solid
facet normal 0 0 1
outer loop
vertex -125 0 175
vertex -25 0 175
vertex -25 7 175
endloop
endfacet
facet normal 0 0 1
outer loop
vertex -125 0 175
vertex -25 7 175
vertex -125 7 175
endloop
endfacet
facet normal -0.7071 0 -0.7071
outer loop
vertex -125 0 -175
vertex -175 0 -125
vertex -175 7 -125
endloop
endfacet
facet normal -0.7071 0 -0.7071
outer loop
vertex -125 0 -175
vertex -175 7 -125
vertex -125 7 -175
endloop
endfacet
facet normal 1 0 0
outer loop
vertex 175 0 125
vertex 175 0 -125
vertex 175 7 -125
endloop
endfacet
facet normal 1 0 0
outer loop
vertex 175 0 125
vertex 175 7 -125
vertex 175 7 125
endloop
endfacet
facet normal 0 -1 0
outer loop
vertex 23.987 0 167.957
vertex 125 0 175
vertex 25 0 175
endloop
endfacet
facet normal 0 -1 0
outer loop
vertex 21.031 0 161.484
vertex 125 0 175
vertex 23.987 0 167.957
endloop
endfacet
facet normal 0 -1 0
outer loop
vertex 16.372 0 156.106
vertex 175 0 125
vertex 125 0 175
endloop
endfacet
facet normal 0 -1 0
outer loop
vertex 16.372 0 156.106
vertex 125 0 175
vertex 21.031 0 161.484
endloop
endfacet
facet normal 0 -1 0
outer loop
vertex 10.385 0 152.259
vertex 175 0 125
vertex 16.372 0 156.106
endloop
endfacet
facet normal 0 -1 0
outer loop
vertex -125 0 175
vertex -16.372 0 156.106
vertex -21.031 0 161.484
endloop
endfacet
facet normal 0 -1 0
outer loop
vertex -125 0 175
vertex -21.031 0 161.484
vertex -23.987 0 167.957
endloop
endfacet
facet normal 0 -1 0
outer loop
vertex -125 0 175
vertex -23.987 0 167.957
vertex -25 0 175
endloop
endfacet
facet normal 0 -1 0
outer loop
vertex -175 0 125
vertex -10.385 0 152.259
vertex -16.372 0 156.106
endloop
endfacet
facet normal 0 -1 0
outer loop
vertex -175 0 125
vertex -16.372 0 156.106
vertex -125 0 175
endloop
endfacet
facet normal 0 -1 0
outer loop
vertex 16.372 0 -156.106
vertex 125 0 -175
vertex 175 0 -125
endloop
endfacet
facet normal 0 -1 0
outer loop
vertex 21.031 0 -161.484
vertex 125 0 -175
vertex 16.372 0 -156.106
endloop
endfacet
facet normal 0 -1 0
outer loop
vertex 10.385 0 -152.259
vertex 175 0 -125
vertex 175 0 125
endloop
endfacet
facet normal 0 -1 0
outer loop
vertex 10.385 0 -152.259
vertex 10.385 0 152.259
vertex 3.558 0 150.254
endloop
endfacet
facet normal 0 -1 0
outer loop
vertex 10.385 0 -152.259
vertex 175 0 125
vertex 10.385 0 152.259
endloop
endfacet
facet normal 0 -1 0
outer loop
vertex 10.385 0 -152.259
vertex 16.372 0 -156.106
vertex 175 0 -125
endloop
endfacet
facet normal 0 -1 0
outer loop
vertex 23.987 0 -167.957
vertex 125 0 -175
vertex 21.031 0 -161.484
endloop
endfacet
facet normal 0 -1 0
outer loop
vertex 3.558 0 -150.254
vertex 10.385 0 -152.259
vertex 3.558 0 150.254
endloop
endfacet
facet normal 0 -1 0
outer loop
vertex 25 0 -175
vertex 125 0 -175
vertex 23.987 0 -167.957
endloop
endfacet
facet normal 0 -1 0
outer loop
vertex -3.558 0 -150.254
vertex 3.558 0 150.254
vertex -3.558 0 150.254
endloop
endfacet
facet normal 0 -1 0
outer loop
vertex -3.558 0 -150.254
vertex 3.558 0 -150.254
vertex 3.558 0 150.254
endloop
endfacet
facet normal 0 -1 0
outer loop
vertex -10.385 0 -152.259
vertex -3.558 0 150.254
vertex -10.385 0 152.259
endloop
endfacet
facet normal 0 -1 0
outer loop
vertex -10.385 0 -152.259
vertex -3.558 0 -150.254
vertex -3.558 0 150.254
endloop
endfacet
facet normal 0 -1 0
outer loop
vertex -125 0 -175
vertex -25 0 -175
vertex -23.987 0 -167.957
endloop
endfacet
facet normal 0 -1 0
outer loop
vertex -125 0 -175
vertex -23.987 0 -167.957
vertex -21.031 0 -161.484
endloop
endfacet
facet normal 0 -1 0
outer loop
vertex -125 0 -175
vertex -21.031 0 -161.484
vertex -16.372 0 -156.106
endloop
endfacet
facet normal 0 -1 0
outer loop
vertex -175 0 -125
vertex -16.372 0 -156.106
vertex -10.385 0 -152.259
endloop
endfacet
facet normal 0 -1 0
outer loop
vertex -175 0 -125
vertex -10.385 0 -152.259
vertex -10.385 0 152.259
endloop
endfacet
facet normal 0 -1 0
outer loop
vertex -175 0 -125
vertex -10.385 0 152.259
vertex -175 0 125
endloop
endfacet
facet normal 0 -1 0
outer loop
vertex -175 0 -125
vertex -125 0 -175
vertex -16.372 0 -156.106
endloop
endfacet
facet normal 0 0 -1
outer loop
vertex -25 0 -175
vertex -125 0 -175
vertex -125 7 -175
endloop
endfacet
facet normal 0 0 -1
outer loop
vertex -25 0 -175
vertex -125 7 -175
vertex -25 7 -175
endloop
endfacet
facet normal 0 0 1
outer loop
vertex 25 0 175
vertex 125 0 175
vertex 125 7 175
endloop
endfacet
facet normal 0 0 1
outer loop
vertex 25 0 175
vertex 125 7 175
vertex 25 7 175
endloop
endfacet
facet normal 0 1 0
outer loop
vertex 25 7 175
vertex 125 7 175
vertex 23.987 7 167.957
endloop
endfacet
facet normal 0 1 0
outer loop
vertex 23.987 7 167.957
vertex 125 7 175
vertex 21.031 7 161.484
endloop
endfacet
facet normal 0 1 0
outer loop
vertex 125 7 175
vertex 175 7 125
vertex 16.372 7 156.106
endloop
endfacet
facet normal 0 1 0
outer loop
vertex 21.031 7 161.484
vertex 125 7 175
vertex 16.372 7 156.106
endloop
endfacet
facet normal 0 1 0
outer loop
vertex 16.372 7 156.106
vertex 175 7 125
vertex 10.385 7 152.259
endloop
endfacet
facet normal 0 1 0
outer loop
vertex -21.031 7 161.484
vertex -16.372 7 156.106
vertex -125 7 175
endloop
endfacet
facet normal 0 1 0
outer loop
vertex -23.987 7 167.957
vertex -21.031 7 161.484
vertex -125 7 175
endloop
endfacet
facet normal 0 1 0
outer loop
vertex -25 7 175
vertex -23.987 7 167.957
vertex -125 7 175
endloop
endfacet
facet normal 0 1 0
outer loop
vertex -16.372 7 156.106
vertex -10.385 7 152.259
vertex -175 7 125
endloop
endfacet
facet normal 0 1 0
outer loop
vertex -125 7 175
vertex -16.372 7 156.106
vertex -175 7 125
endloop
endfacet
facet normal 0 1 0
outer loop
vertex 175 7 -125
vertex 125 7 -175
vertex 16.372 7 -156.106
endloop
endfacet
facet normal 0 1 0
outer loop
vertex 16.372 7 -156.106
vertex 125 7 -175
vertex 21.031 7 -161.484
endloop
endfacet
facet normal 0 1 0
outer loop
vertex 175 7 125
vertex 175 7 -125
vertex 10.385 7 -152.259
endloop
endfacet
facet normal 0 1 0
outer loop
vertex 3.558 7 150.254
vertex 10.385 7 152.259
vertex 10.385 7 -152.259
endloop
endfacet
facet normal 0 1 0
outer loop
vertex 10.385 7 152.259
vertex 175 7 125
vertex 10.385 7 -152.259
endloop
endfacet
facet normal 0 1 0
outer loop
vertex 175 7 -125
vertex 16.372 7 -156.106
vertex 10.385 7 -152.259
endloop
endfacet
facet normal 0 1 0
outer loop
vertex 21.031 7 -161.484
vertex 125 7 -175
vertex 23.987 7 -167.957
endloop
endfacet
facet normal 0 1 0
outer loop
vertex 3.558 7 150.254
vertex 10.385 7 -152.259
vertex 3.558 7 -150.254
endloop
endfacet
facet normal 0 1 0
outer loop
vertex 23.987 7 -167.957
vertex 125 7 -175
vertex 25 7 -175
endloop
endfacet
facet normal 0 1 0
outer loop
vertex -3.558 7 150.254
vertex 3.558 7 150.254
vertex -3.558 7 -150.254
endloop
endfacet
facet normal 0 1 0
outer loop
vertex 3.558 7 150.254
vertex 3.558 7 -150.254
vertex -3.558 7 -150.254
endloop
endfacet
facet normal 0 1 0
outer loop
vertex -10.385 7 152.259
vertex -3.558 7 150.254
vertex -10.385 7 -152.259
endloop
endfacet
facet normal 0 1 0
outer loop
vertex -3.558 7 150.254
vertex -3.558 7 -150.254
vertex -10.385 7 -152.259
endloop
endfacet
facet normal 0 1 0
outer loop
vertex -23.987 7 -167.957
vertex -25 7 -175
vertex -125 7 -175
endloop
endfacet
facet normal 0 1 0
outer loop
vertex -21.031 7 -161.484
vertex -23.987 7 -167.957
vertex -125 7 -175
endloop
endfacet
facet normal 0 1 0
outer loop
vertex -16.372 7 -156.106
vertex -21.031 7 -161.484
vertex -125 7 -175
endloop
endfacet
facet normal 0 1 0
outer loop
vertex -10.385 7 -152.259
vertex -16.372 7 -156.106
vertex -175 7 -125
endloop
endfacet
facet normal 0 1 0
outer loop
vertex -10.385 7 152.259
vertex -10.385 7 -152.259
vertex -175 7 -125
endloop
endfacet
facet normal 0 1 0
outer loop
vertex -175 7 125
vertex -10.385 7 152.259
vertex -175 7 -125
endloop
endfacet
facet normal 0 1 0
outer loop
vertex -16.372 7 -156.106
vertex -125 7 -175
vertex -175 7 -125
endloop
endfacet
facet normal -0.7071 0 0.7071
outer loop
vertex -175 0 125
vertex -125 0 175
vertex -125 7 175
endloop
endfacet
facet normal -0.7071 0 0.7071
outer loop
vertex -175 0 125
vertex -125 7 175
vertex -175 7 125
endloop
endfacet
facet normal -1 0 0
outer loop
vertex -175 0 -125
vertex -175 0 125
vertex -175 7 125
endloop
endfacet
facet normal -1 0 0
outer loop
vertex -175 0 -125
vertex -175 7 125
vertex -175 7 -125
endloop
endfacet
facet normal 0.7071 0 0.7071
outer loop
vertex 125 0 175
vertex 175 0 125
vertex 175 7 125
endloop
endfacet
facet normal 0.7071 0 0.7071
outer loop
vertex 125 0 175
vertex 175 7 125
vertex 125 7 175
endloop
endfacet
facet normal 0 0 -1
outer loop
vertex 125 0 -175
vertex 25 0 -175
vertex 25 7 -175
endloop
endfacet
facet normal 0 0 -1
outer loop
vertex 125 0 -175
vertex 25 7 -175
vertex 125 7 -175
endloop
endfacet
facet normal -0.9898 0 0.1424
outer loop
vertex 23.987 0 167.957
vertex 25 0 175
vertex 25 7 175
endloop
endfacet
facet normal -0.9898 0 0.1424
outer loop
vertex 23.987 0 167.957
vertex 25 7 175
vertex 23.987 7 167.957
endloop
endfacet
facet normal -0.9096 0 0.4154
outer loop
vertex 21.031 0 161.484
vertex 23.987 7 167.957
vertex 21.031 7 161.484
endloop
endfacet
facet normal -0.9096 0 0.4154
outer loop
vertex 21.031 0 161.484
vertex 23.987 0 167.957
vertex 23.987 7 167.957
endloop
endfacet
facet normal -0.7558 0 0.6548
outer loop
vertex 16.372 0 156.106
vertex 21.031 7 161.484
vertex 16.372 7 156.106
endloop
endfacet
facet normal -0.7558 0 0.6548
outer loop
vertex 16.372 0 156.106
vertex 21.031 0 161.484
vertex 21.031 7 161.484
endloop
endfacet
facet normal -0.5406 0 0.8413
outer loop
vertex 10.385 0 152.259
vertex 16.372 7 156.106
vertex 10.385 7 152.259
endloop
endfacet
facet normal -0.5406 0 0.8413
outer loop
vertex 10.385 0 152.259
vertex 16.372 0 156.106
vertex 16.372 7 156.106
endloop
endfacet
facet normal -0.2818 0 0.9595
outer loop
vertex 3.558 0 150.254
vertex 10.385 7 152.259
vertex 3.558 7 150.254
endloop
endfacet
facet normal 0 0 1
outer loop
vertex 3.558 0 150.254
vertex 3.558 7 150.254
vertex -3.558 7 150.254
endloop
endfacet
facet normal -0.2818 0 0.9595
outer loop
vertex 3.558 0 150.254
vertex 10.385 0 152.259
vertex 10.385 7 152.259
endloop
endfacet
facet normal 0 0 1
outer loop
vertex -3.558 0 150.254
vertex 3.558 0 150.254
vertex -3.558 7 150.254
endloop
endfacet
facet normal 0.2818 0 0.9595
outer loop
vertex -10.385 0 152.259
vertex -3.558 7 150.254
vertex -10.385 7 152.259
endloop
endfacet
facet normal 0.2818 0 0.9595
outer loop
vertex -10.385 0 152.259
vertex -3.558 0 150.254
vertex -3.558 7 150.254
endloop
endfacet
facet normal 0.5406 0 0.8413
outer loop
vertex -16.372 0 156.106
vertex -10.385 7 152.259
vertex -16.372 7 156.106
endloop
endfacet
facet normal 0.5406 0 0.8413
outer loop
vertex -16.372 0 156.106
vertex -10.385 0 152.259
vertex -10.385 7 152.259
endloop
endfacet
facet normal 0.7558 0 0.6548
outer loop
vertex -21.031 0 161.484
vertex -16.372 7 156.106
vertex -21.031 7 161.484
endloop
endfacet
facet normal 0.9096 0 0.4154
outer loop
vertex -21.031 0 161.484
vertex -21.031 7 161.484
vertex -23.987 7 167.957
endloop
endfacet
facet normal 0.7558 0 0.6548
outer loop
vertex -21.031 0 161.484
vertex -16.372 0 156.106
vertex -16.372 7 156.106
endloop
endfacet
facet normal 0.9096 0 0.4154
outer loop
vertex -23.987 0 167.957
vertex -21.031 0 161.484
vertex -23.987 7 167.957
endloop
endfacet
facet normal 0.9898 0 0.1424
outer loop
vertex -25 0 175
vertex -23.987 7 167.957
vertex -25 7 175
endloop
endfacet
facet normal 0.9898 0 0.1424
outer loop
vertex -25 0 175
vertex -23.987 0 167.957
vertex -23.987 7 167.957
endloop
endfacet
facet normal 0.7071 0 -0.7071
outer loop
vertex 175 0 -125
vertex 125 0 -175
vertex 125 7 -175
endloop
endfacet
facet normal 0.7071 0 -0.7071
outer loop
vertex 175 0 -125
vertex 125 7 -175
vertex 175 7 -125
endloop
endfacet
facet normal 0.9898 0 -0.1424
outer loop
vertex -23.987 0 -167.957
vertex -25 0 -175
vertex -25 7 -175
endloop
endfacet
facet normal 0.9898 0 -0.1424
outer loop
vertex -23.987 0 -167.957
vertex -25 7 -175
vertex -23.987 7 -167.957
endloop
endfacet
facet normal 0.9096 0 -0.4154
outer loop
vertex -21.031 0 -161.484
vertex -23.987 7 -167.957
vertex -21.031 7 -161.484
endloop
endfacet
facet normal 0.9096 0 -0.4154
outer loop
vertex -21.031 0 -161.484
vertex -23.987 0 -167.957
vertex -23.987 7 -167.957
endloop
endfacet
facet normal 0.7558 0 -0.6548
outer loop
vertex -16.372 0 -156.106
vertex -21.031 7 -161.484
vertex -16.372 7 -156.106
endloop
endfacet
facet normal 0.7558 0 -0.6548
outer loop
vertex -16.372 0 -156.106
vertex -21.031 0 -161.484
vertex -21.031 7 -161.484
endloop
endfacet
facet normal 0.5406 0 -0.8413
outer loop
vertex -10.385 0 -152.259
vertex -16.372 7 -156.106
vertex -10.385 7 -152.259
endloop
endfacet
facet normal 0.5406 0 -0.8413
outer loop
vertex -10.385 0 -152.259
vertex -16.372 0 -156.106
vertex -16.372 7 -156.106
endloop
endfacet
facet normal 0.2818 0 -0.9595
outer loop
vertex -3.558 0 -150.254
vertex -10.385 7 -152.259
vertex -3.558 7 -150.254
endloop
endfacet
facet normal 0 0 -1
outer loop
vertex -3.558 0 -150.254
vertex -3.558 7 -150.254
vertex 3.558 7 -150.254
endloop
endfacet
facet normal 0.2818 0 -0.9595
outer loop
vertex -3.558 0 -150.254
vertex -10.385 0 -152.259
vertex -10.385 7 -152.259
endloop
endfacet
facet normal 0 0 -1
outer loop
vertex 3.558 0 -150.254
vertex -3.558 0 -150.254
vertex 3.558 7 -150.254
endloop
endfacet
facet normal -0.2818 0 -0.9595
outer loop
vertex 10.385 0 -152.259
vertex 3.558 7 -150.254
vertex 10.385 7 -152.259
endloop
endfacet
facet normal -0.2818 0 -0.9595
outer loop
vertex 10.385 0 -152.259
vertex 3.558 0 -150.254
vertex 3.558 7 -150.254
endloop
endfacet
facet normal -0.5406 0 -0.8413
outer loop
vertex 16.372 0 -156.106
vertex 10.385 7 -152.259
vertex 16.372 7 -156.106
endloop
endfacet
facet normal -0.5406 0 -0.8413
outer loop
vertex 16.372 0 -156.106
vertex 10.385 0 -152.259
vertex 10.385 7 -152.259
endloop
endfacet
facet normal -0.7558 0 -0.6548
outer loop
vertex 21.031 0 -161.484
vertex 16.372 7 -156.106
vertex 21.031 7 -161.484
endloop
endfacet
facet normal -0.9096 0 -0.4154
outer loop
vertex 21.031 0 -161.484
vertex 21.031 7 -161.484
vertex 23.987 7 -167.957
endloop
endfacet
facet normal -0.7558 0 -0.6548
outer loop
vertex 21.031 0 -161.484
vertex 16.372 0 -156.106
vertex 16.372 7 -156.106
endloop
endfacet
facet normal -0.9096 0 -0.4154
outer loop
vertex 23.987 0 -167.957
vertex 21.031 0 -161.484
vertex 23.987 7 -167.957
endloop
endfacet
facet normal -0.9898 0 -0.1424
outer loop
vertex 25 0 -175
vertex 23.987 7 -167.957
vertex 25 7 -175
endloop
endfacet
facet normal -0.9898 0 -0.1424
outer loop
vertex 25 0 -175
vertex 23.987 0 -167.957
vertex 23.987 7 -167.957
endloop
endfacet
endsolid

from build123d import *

# Parameters (mm, degrees)
BOSS_EXTRUDE1_DEPTH = 7


with BuildPart() as part:
    # Sketch1 → Boss-Extrude1 (new body)
    with BuildSketch(Plane(origin=(0, 0, 0), x_dir=(1, 0, 0), z_dir=(0, 1, 0))):
        with BuildLine():
            Line((-125, 175), (-25, 175))
            ThreePointArc((-25, 175), (0, 150), (25, 175))
            Line((25, 175), (125, 175))
            Line((125, 175), (175, 125))
            Line((175, 125), (175, -125))
            Line((175, -125), (125, -175))
            Line((125, -175), (25, -175))
            ThreePointArc((25, -175), (0, -150), (-25, -175))
            Line((-25, -175), (-125, -175))
            Line((-125, -175), (-175, -125))
            Line((-175, -125), (-175, 125))
            Line((-175, 125), (-125, 175))
        make_face()
    extrude(amount=BOSS_EXTRUDE1_DEPTH)


solid = part.part
